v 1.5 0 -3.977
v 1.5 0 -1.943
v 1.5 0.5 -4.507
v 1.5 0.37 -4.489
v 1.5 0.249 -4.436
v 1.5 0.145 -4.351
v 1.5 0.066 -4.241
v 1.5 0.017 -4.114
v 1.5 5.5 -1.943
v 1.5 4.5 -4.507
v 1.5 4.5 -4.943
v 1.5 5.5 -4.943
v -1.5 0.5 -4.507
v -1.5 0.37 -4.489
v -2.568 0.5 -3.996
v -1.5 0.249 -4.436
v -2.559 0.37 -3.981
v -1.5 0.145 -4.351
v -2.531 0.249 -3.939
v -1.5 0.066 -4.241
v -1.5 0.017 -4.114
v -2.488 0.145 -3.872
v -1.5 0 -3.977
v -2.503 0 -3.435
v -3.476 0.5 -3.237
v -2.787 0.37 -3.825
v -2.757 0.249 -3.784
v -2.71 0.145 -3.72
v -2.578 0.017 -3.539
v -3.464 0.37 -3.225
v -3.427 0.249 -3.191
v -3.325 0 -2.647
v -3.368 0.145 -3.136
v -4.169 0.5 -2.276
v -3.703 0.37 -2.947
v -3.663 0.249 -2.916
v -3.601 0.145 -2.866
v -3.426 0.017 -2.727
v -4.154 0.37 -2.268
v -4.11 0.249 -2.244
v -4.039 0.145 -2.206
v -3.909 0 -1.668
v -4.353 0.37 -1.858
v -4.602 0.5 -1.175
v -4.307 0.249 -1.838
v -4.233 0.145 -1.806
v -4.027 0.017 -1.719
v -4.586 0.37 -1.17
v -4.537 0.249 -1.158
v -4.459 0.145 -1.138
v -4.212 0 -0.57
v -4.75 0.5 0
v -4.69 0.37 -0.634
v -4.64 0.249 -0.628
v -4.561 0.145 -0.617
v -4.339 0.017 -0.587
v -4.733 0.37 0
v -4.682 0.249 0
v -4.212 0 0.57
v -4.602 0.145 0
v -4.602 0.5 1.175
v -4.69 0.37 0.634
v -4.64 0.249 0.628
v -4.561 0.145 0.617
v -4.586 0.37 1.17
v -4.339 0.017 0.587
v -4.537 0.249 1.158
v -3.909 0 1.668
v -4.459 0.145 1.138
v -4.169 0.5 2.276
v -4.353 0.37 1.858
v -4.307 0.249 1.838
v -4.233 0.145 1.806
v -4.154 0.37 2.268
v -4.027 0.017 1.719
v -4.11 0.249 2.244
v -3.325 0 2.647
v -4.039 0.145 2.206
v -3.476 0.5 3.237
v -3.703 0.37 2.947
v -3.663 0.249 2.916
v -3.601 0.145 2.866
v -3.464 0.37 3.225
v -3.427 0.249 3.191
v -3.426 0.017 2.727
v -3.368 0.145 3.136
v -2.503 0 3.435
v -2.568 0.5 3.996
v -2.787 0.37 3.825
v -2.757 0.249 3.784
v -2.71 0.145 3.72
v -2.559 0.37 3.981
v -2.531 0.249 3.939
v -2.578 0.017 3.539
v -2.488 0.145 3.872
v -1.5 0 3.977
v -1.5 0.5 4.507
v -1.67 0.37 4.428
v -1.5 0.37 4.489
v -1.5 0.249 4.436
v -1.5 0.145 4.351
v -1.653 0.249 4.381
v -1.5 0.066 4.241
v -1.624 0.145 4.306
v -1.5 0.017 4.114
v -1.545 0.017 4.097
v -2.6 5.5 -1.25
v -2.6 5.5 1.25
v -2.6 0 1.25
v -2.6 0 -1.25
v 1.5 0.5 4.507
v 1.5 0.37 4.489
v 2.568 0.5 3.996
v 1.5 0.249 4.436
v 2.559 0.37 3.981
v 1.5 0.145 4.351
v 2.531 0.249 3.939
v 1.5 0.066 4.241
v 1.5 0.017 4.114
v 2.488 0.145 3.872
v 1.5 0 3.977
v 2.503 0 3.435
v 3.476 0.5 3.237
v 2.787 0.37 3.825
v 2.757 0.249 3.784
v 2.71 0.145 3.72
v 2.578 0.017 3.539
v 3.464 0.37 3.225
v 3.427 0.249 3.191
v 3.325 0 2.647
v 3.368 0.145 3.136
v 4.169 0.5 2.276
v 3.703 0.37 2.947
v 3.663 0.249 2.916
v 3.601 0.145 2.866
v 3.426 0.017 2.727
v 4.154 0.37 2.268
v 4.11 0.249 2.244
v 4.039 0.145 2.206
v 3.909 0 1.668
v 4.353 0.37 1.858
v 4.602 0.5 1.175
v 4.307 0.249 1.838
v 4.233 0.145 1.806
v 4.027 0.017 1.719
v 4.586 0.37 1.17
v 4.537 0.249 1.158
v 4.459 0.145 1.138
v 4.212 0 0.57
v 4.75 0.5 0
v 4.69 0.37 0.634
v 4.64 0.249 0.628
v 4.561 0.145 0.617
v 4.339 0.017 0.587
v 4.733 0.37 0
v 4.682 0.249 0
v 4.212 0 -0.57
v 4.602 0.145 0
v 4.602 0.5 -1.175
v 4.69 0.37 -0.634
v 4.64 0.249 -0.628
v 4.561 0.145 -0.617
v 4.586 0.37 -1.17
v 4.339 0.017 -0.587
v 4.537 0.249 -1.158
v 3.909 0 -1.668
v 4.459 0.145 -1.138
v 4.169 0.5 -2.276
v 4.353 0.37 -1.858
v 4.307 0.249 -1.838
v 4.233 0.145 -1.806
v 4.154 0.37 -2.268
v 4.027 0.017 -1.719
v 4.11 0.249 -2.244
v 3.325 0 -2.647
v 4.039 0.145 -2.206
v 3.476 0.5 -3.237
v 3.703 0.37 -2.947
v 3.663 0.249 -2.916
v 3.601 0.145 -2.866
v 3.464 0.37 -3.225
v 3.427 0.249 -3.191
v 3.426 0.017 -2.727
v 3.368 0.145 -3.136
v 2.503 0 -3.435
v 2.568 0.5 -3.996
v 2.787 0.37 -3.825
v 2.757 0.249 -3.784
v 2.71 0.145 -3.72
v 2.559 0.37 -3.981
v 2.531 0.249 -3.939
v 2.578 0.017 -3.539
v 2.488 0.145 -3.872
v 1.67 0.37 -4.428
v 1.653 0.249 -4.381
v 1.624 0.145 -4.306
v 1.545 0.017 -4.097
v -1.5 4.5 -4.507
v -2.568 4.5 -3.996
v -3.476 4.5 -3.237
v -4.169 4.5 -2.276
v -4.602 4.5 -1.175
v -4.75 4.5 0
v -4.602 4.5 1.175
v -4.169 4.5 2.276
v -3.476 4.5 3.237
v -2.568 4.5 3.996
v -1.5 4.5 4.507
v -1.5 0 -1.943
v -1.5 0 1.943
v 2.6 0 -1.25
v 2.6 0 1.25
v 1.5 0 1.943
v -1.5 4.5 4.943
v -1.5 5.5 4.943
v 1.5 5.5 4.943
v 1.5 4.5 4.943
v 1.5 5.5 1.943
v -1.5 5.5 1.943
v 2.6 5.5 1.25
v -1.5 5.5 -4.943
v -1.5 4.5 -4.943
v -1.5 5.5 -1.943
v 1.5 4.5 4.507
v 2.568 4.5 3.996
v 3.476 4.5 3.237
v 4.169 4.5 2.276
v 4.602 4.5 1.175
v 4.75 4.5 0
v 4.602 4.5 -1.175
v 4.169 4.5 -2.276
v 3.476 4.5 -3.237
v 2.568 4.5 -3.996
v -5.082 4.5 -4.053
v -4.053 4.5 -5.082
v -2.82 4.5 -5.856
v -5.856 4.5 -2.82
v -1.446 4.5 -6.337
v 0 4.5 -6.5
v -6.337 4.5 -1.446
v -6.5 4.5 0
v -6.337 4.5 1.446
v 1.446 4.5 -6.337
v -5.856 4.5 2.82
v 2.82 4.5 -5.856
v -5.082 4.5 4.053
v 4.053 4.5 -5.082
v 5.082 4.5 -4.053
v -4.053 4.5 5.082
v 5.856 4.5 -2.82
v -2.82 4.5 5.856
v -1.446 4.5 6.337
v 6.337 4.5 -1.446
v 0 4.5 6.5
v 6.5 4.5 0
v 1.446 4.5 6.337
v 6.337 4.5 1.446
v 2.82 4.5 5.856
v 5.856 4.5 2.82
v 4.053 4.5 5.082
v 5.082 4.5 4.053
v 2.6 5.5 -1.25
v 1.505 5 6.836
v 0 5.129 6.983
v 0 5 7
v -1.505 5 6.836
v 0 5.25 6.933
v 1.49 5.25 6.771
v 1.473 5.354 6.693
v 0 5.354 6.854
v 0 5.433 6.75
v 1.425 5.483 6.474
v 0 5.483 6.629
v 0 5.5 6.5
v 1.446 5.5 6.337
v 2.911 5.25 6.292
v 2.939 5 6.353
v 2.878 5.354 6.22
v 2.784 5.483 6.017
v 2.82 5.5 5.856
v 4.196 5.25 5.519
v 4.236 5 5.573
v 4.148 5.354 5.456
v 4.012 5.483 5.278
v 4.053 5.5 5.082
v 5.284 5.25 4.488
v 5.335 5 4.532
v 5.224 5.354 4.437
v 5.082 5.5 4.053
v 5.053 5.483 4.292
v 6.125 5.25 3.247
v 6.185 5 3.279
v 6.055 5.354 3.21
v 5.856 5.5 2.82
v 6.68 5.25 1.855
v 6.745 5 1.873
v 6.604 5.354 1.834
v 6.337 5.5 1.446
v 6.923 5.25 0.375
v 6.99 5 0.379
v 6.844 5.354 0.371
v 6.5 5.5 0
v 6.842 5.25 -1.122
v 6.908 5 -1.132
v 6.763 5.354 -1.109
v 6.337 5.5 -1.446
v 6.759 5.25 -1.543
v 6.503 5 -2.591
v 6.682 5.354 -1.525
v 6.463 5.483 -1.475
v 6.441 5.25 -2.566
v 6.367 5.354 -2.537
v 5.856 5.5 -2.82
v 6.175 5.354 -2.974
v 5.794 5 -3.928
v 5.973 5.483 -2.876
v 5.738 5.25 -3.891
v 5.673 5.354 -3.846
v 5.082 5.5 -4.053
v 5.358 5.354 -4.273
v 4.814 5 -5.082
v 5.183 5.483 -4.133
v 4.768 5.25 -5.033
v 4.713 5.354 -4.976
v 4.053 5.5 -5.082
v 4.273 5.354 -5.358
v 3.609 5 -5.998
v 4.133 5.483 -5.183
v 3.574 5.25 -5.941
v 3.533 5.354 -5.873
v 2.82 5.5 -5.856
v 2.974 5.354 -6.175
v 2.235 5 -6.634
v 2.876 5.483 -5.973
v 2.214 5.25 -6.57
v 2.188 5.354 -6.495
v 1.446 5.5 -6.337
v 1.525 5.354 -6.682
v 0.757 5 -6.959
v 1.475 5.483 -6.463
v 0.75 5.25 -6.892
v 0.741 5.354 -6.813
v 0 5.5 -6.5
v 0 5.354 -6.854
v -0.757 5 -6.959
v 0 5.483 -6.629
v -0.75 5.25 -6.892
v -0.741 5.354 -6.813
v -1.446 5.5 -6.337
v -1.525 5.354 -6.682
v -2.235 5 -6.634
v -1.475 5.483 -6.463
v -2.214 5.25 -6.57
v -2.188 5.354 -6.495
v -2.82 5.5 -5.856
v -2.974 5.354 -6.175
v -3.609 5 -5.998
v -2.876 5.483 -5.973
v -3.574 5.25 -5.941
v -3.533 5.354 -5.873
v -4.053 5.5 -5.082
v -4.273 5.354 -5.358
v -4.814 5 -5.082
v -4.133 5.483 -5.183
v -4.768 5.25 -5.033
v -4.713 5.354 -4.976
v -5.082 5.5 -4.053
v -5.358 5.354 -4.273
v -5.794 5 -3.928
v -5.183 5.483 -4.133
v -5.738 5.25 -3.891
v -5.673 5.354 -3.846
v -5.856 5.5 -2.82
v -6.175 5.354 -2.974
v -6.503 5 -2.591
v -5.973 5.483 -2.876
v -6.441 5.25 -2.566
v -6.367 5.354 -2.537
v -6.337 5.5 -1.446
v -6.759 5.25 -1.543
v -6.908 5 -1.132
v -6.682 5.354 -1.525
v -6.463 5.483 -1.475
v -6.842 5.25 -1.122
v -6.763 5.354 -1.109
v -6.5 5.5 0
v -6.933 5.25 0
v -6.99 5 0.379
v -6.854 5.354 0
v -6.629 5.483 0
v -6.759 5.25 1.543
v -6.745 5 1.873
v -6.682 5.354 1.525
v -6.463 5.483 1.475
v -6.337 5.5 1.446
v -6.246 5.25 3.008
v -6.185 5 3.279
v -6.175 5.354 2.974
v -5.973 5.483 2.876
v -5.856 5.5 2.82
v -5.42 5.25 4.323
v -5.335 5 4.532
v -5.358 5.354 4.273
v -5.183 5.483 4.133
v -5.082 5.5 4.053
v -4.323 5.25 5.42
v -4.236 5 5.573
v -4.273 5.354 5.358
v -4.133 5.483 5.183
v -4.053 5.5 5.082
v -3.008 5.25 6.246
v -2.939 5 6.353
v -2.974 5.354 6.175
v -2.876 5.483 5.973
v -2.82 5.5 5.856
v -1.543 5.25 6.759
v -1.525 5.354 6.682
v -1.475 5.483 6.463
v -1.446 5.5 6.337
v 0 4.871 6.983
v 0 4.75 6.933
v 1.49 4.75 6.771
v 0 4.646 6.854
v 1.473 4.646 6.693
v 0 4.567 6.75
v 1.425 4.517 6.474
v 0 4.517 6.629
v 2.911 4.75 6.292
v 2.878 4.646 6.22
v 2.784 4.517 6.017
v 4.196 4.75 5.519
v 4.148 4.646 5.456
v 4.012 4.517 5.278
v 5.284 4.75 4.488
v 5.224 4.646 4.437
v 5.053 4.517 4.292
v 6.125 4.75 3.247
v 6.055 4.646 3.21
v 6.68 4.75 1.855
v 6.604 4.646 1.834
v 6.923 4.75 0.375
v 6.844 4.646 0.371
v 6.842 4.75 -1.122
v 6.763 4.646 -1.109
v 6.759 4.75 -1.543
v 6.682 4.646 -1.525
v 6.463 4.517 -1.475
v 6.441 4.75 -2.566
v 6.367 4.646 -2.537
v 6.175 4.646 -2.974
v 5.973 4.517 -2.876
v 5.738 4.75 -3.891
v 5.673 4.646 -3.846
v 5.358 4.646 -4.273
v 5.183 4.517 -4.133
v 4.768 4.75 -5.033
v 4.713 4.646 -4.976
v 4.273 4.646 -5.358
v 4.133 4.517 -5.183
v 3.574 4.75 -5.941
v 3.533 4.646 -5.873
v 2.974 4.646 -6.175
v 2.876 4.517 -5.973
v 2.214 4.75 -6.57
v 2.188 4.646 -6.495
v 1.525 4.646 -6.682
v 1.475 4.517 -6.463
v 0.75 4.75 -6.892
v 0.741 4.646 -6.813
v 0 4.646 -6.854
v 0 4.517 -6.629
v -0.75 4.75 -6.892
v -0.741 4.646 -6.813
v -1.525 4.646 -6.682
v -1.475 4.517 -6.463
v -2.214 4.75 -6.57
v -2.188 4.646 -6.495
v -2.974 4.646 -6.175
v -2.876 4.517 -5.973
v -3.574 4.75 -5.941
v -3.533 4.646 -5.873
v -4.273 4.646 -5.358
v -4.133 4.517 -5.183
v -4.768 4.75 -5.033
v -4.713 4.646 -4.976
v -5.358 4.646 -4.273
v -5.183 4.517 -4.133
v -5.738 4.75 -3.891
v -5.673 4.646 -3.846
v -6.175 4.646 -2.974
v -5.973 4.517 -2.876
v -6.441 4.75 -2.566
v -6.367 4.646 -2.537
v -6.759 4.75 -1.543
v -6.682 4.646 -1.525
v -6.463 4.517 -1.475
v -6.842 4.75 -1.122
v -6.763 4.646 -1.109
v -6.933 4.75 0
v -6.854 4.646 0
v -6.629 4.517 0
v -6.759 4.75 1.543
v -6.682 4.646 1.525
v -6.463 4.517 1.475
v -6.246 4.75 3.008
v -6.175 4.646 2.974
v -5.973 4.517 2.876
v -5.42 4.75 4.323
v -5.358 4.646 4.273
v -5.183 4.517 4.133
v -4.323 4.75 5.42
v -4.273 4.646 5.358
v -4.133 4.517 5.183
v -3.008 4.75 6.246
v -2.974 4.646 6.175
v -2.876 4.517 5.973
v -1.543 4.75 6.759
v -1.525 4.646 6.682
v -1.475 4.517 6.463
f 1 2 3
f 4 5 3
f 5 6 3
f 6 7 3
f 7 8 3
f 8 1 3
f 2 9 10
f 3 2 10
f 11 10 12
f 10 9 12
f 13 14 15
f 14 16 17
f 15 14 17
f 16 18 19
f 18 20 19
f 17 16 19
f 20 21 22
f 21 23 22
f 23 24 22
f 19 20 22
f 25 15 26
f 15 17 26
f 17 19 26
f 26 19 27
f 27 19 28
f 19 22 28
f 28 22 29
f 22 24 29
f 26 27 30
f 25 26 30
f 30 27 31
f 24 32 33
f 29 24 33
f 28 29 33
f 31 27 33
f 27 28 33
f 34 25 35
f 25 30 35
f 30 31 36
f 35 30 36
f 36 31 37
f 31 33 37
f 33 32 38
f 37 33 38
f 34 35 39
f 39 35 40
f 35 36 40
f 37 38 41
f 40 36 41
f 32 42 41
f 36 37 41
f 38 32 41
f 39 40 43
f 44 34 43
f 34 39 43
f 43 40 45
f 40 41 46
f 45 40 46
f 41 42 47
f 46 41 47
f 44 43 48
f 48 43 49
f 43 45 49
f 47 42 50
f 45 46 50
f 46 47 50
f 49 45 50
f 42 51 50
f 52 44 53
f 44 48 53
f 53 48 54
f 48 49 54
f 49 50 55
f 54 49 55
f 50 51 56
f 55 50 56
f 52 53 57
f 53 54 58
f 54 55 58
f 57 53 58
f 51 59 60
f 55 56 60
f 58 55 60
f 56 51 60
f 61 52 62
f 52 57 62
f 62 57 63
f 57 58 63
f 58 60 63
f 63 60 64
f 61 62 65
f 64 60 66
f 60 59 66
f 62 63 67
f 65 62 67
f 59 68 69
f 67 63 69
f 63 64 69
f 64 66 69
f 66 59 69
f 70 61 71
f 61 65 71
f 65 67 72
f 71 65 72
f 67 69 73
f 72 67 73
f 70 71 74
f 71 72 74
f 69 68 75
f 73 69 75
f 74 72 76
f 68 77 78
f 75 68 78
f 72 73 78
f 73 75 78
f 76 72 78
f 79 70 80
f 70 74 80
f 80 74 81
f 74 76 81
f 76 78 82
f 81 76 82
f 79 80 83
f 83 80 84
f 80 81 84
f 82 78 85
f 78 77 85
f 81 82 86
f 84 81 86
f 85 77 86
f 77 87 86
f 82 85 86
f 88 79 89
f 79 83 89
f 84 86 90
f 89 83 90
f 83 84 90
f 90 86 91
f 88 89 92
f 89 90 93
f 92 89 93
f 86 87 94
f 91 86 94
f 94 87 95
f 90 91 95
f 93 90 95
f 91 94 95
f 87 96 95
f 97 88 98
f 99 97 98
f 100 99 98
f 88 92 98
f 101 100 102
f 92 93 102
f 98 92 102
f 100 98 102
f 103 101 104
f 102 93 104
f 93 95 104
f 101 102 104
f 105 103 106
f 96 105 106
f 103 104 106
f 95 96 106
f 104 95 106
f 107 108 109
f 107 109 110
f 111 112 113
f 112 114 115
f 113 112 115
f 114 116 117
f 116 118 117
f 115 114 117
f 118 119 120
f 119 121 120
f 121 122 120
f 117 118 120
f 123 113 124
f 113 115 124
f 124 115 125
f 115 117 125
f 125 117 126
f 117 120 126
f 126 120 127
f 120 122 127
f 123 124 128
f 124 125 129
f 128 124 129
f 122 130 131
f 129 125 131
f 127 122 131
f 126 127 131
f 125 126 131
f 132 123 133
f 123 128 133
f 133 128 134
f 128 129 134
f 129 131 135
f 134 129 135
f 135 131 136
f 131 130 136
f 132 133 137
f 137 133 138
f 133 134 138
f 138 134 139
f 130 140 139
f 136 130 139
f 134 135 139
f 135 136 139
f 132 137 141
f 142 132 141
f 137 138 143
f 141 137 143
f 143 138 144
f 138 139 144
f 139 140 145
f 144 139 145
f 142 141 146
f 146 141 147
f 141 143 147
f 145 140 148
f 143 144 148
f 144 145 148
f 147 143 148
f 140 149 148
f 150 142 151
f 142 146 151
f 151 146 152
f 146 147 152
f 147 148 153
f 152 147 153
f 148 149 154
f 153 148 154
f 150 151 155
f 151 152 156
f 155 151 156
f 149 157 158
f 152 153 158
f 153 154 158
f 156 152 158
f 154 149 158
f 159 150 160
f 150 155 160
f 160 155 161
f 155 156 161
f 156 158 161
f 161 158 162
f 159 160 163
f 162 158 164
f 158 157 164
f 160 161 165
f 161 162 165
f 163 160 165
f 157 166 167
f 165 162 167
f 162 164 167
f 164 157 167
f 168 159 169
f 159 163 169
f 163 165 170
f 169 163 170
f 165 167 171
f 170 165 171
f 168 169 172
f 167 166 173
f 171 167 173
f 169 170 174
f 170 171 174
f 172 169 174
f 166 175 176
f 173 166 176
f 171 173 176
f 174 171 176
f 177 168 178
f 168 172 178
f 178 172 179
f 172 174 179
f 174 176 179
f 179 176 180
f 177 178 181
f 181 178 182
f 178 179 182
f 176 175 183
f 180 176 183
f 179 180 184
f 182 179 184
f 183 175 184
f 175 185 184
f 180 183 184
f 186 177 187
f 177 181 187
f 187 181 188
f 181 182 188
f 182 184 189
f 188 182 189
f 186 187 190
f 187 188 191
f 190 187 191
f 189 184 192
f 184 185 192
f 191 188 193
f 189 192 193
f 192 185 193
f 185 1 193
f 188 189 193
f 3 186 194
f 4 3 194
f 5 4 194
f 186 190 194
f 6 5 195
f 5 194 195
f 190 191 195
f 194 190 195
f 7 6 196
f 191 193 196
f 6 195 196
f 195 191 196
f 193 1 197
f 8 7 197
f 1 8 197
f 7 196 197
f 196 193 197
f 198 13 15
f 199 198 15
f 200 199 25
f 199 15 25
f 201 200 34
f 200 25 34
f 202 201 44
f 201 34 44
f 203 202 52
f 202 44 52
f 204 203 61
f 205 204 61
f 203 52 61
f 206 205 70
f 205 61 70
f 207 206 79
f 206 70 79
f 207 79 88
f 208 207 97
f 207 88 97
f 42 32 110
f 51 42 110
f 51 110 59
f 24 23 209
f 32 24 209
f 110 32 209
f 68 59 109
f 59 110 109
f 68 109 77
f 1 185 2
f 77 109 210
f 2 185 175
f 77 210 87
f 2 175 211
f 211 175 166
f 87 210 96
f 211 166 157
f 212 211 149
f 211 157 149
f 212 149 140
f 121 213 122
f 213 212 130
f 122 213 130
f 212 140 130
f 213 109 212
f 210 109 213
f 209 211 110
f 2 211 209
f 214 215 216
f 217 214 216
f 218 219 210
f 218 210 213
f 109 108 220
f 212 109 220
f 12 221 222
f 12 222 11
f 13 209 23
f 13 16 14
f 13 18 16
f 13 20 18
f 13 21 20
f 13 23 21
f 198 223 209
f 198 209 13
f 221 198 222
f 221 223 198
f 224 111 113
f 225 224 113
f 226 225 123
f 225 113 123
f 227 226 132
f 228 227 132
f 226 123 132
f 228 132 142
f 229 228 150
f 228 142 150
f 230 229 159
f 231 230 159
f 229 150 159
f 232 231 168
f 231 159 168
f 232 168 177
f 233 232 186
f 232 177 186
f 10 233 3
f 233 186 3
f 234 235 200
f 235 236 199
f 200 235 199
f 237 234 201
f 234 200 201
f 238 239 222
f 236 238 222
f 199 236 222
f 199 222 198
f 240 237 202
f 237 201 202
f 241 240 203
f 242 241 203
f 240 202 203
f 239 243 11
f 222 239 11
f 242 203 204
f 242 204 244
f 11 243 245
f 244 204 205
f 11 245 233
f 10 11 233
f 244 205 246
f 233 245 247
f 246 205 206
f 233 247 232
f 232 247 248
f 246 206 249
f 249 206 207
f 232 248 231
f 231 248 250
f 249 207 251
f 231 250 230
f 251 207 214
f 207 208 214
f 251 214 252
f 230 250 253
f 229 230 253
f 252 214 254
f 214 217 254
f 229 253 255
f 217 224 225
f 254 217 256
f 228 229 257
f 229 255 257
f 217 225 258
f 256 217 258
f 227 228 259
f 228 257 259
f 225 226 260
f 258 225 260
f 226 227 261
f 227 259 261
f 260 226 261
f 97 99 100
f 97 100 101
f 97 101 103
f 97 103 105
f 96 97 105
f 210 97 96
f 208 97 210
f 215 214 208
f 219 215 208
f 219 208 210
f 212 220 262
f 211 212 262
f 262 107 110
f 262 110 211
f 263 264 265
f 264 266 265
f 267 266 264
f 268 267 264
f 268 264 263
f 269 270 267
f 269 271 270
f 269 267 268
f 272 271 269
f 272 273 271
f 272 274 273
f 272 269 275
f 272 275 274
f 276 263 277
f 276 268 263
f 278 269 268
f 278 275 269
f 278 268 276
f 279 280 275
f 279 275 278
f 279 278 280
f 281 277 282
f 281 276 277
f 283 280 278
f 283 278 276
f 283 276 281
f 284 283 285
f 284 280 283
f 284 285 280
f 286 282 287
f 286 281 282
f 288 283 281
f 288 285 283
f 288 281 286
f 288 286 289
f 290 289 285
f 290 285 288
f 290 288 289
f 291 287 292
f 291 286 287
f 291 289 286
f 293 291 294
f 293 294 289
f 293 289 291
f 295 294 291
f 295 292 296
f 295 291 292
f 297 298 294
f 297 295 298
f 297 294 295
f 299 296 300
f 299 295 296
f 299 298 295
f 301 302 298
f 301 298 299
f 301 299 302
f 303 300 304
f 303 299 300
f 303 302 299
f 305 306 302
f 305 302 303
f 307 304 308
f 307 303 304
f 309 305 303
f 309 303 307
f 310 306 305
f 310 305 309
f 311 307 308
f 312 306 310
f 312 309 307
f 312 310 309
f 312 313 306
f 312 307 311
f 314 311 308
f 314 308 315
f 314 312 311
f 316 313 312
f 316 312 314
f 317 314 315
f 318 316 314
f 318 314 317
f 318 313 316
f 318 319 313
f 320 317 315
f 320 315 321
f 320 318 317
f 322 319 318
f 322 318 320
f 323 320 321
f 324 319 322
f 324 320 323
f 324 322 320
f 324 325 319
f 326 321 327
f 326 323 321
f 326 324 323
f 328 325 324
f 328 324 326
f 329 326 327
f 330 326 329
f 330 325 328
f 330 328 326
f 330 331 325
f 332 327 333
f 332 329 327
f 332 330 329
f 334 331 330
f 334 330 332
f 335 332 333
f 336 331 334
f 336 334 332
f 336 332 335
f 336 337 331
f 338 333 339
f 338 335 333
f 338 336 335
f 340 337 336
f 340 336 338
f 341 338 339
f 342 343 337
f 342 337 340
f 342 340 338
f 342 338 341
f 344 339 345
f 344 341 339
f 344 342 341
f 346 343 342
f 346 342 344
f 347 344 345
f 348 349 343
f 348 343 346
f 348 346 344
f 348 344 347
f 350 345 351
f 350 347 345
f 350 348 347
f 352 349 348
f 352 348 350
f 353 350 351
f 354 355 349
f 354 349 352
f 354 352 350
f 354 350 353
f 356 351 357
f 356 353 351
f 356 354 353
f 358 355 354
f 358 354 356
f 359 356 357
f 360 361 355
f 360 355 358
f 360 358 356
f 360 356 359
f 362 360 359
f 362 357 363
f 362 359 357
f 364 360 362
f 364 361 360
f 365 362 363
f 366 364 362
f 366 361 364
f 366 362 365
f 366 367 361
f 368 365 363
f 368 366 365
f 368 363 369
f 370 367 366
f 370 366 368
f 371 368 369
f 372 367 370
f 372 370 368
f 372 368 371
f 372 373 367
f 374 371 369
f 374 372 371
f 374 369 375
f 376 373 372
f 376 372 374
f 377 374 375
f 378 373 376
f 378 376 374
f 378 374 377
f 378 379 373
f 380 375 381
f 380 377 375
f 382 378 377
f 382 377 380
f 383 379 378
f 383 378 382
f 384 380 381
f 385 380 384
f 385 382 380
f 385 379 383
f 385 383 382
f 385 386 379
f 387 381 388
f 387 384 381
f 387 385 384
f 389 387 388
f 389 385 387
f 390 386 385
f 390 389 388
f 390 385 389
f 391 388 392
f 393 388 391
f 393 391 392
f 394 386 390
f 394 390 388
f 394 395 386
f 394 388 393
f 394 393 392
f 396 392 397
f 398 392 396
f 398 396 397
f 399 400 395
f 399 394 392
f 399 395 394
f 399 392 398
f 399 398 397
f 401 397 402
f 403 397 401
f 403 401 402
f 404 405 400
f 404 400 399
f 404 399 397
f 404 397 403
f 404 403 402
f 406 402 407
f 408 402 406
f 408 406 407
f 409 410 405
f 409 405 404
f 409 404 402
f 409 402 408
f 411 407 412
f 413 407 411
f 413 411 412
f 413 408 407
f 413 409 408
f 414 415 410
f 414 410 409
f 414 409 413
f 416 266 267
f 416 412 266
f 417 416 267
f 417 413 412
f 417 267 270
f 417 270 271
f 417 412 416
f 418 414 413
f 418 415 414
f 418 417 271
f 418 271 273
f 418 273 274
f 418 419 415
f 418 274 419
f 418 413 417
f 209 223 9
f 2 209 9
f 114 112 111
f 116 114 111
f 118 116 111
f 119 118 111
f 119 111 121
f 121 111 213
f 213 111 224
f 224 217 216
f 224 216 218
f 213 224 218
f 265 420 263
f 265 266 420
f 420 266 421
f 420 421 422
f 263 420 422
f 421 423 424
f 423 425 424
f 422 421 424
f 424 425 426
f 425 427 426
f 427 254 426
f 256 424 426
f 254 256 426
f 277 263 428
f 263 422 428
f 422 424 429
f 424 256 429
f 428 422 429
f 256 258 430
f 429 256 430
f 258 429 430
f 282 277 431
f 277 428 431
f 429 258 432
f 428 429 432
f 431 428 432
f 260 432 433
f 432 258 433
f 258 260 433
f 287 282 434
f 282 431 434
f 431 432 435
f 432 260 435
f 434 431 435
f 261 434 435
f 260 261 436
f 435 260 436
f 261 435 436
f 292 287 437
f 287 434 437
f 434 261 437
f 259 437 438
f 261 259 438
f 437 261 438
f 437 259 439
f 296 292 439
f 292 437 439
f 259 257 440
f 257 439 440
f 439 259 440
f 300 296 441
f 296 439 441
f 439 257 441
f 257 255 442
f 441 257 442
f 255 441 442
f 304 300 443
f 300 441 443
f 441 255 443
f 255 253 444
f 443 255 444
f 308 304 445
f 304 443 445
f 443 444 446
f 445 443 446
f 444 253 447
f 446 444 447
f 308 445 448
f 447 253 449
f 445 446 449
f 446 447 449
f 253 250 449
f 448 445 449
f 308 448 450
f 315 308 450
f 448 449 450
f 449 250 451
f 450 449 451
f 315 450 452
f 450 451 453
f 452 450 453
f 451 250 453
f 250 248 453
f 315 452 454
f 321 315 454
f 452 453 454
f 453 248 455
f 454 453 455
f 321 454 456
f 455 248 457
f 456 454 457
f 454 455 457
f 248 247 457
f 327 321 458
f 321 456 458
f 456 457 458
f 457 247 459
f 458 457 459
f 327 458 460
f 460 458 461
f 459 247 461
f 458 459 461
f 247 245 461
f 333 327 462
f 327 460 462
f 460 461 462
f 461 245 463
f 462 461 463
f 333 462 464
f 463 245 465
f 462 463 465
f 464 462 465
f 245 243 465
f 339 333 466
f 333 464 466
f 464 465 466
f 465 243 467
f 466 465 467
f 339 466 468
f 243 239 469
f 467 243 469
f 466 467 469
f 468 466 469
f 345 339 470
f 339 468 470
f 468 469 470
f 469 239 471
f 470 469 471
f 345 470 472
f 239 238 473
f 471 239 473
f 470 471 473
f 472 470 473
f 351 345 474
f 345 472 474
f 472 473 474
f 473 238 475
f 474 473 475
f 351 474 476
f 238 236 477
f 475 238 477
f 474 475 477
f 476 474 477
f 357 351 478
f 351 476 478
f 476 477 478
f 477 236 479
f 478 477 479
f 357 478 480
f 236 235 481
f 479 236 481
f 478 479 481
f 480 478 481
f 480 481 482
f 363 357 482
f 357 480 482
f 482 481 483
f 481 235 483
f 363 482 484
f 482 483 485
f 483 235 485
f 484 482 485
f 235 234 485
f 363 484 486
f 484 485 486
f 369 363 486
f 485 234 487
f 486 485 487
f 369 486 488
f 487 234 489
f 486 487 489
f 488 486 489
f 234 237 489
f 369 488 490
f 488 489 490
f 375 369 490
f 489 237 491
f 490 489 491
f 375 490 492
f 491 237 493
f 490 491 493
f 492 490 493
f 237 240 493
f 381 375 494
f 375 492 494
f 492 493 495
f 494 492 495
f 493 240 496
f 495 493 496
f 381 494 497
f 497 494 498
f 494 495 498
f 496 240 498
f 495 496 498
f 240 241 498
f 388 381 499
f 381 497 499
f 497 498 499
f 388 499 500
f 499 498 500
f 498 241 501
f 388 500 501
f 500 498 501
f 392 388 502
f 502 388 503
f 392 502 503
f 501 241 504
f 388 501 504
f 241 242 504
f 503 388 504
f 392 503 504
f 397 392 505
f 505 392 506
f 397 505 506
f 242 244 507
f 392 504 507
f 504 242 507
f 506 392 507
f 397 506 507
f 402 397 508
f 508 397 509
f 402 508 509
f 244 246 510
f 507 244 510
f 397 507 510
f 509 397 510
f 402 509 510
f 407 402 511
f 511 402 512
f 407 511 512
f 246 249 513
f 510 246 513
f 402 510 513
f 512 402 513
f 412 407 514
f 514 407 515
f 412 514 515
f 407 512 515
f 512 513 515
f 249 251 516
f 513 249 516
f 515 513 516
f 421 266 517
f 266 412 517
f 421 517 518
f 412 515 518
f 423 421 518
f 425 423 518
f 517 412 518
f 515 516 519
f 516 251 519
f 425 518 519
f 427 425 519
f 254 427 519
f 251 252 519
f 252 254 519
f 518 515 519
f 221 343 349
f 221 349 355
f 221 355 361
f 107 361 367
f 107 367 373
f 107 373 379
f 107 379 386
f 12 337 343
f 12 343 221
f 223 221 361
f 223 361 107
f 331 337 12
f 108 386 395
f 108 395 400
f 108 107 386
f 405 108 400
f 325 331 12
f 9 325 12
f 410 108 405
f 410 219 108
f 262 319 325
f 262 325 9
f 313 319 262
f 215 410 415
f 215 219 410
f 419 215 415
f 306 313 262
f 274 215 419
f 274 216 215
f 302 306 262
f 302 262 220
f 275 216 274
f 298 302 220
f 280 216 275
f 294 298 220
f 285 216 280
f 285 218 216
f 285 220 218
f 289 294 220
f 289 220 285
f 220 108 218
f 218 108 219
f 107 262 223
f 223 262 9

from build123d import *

# Parameters (mm, degrees)
SKETCH1_R           = 4.75
BOSS_EXTRUDE1_DEPTH = 4.5
SKETCH2_R           = 7
BOSS_EXTRUDE2_DEPTH = 1
SKETCH3_W           = 3
SKETCH3_H           = 3
CUT_EXTRUDE1_DEPTH  = 12.324751653
FILLET3_R           = 0.5
SKETCH4_W           = 5.2
SKETCH4_H           = 2.5
CUT_EXTRUDE2_DEPTH  = 12.324751763


with BuildPart() as part:
    # Sketch1 → Boss-Extrude1 (new body)
    with BuildSketch(Plane(origin=(0, 0, 0), x_dir=(1, 0, 0), z_dir=(0, 1, 0))):
        with Locations(Location((0, 0, 0), (0, 0, 270))):
            Circle(SKETCH1_R)
    extrude(amount=BOSS_EXTRUDE1_DEPTH)

    # Sketch2 → Boss-Extrude2 (add)
    with BuildSketch(Plane(origin=(0, 4.5, 0), x_dir=(1, 0, 0), z_dir=(0, 1, 0))):
        with Locations(Location((0, 0, 0), (0, 0, 270))):
            Circle(SKETCH2_R)
    extrude(amount=BOSS_EXTRUDE2_DEPTH)

    # Sketch3 → Cut-Extrude1 (cut, through all)
    with BuildSketch(Plane(origin=(0, 5.5, 0), x_dir=(1, 0, 0), z_dir=(0, 1, 0))):
        with Locations((0, 3.443002763)):
            Rectangle(SKETCH3_W, SKETCH3_H)
        with Locations((0, -3.443002763)):
            Rectangle(SKETCH3_W, SKETCH3_H)
    extrude(amount=-CUT_EXTRUDE1_DEPTH, mode=Mode.SUBTRACT)

    # Fillet3
    fillet3_edges = [part.edges().sort_by_distance(p)[0] for p in [
        (-4.75, 0, 0),
        (4.75, 0, 0),
        (0, 4.5, -7),
        (0, 5.5, -7),
    ]]
    fillet(fillet3_edges, radius=FILLET3_R - 0.0001)  # a hair under: the kernel refuses the full size

    # Sketch4 → Cut-Extrude2 (cut, through all)
    with BuildSketch(Plane(origin=(0, 5.5, 0), x_dir=(1, 0, 0), z_dir=(0, 1, 0))):
        Rectangle(SKETCH4_W, SKETCH4_H)
    extrude(amount=-CUT_EXTRUDE2_DEPTH, mode=Mode.SUBTRACT)


solid = part.part
